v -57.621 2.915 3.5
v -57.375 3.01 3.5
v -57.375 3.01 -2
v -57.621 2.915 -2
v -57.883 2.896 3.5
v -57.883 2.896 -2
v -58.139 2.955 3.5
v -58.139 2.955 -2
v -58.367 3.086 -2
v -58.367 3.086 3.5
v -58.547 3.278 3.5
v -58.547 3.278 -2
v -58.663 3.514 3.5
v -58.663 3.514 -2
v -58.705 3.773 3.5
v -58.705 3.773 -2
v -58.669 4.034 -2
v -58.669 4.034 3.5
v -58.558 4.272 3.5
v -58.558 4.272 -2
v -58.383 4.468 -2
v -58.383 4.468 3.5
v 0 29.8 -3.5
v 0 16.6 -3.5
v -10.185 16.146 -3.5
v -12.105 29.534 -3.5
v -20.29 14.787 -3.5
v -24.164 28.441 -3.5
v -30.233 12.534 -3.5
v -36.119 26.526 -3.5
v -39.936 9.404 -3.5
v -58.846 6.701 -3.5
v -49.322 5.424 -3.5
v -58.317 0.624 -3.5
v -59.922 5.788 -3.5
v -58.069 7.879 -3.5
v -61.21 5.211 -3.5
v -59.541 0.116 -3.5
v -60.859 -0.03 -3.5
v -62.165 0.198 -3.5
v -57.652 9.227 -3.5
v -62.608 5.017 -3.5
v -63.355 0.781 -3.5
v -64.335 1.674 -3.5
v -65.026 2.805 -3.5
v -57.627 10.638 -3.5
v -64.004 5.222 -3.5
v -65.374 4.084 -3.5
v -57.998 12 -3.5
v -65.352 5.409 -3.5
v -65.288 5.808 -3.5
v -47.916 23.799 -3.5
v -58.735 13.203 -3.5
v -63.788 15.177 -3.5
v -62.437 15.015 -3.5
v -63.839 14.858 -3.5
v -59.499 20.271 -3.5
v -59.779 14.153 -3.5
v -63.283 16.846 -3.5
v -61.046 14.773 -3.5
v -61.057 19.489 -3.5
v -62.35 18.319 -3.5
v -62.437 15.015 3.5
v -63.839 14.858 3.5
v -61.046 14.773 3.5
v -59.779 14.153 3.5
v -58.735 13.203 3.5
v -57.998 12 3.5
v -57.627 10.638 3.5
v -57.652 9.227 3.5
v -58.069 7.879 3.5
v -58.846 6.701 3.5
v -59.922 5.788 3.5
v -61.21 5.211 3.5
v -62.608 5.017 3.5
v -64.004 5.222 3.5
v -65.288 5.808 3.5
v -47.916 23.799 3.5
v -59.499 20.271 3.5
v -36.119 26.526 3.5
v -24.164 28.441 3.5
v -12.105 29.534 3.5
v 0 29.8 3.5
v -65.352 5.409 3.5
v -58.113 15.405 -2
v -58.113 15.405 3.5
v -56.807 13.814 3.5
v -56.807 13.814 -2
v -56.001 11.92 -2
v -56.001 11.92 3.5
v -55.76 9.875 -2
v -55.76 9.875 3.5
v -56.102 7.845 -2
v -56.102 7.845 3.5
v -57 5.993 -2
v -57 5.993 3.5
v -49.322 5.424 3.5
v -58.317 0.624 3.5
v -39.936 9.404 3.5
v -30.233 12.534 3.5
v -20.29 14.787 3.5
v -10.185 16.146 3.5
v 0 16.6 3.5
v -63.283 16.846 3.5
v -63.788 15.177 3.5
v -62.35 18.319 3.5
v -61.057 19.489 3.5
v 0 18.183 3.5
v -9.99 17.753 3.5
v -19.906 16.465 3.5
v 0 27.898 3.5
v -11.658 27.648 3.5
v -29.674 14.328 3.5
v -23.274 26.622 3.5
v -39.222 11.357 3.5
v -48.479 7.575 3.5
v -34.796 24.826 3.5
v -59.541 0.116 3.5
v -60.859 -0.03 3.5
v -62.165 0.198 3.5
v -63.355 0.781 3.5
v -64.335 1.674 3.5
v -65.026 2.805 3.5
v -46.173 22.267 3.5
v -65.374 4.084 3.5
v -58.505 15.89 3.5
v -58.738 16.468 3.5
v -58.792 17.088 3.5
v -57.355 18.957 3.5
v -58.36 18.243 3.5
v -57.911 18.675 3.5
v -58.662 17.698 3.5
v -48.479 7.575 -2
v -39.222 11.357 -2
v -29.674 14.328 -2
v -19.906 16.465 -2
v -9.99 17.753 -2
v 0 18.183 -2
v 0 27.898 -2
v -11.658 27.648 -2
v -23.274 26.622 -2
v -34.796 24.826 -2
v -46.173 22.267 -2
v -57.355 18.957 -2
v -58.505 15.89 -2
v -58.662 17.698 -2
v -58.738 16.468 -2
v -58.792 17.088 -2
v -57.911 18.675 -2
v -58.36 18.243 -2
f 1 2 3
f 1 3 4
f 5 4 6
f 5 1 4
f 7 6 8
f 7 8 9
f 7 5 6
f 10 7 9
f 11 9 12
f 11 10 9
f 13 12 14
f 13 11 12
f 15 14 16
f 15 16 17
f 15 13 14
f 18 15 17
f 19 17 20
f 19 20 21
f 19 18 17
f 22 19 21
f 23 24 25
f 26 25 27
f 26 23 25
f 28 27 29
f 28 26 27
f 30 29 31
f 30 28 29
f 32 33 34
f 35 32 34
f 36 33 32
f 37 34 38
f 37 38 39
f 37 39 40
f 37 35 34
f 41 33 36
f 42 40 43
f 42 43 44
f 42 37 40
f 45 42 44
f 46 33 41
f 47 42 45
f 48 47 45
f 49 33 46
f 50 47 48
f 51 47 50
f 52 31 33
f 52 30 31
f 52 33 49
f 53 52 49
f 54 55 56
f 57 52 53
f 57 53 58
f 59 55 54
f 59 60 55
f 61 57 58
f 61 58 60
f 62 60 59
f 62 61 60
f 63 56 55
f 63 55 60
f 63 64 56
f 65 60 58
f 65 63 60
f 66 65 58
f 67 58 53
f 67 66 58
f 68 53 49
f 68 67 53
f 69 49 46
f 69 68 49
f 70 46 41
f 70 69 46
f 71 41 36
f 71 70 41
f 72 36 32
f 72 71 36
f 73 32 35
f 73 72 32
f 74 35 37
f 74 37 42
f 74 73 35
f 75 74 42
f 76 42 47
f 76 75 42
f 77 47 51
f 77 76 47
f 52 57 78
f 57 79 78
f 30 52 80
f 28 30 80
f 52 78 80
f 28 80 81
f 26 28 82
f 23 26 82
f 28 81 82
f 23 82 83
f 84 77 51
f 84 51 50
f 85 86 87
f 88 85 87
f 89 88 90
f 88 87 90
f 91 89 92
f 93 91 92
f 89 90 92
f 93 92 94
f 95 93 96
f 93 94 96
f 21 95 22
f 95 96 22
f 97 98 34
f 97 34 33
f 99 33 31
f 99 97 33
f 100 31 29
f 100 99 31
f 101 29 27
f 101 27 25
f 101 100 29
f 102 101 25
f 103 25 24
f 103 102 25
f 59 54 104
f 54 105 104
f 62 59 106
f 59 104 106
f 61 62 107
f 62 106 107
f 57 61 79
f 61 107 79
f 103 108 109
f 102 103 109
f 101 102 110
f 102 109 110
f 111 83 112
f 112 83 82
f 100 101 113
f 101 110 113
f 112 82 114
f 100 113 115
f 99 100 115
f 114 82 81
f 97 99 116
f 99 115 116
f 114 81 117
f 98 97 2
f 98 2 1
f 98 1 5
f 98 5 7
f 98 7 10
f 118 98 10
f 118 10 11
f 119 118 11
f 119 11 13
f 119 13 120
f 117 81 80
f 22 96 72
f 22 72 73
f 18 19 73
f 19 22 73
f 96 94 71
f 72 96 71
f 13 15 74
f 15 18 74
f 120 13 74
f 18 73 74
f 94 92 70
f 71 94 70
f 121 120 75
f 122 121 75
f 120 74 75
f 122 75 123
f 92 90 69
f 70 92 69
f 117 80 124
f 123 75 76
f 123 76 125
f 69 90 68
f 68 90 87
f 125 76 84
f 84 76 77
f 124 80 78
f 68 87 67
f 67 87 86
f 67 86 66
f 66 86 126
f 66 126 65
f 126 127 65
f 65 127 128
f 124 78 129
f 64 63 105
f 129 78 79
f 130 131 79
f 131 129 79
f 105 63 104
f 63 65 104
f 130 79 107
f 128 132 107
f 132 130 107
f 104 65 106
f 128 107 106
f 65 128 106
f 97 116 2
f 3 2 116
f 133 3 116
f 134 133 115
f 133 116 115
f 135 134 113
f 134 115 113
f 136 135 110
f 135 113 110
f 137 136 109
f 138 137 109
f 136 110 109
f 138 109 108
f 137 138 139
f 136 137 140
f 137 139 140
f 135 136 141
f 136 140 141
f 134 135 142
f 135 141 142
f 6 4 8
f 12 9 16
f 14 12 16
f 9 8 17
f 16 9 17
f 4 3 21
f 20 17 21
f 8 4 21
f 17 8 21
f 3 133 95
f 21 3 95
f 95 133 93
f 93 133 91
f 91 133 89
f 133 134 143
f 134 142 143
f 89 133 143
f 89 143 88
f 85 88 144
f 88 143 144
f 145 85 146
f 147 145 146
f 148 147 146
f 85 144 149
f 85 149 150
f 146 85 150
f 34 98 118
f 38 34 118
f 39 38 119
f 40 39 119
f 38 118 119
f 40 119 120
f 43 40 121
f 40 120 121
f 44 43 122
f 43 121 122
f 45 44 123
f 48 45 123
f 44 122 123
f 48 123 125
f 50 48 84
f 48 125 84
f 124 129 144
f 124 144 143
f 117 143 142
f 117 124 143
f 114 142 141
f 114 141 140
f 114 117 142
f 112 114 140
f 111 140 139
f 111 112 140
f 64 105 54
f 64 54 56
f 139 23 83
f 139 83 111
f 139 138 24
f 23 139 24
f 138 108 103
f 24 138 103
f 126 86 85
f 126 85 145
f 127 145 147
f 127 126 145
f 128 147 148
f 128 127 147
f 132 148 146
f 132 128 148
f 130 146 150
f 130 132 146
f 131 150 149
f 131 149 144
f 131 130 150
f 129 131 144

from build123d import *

# Parameters (mm, degrees)
PAD003_DEPTH = 3.5
POCKET_DEPTH = 5.5
SKETCH011_W  = 5
SKETCH011_H  = 7.2


with BuildPart() as stirn:
    # Sketch010 → Pad003 (new body, symmetric)
    with BuildSketch(Plane.XY):
        with BuildLine():
            ThreePointArc((59.498979, 20.271308), (30.157918, 27.585958), (0, 29.8))
            Line((0, 29.8), (0, 16.6))
            ThreePointArc((58.317055, 0.623642), (30.232941, 12.533656), (0, 16.6))
            ThreePointArc((58.317055, 0.623642), (63.354776, 0.781276), (65.351677, 5.409004))
            Line((63.7883, 15.177117), (65.351677, 5.409004))
            ThreePointArc((63.7883, 15.177117), (62.350118, 18.319069), (59.498979, 20.271308))
        make_face()
    extrude(amount=PAD003_DEPTH, both=True)

    # Sketch009 → Pocket (cut)
    with BuildSketch(Plane.XY.offset(3.5)):
        with BuildLine():
            Line((0, 27.898268), (0, 18.183007))
            ThreePointArc((57.375322, 3.010124), (29.674349, 14.327664), (0, 18.183007))
            ThreePointArc((57.375322, 3.010124), (58.546948, 3.277627), (58.382807, 4.46814))
            ThreePointArc((58.112759, 15.405314), (55.75963, 9.875292), (58.382807, 4.46814))
            ThreePointArc((58.112759, 15.405314), (58.750082, 17.397997), (57.35497, 18.957045))
            ThreePointArc((57.35497, 18.957045), (29.050369, 25.819583), (0, 27.898268))
        make_face()
    extrude(amount=-POCKET_DEPTH, mode=Mode.SUBTRACT)

    # Sketch011 (on Face2 of Pocket) → Groove (revolve, cut)
    with BuildSketch(Plane(origin=(62.588677, 10.017255, 0), x_dir=(-0.158038, 0.987433, 0), z_dir=(0.987433, 0.158038, 0))):
        with Locations((2.5, 0)):
            Rectangle(SKETCH011_W, SKETCH011_H)
    revolve(axis=Axis((62.588677, 10.017255, 0), (0, 0, 1)), mode=Mode.SUBTRACT)


with BuildPart() as part_mirroring:
    # Part__Mirroring: instance of Stirn
    add(stirn.part.mirror(Plane(origin=(0, 0, 0), x_dir=(0, -1, 0), z_dir=(1, 0, 0))))


solid = part_mirroring.part
